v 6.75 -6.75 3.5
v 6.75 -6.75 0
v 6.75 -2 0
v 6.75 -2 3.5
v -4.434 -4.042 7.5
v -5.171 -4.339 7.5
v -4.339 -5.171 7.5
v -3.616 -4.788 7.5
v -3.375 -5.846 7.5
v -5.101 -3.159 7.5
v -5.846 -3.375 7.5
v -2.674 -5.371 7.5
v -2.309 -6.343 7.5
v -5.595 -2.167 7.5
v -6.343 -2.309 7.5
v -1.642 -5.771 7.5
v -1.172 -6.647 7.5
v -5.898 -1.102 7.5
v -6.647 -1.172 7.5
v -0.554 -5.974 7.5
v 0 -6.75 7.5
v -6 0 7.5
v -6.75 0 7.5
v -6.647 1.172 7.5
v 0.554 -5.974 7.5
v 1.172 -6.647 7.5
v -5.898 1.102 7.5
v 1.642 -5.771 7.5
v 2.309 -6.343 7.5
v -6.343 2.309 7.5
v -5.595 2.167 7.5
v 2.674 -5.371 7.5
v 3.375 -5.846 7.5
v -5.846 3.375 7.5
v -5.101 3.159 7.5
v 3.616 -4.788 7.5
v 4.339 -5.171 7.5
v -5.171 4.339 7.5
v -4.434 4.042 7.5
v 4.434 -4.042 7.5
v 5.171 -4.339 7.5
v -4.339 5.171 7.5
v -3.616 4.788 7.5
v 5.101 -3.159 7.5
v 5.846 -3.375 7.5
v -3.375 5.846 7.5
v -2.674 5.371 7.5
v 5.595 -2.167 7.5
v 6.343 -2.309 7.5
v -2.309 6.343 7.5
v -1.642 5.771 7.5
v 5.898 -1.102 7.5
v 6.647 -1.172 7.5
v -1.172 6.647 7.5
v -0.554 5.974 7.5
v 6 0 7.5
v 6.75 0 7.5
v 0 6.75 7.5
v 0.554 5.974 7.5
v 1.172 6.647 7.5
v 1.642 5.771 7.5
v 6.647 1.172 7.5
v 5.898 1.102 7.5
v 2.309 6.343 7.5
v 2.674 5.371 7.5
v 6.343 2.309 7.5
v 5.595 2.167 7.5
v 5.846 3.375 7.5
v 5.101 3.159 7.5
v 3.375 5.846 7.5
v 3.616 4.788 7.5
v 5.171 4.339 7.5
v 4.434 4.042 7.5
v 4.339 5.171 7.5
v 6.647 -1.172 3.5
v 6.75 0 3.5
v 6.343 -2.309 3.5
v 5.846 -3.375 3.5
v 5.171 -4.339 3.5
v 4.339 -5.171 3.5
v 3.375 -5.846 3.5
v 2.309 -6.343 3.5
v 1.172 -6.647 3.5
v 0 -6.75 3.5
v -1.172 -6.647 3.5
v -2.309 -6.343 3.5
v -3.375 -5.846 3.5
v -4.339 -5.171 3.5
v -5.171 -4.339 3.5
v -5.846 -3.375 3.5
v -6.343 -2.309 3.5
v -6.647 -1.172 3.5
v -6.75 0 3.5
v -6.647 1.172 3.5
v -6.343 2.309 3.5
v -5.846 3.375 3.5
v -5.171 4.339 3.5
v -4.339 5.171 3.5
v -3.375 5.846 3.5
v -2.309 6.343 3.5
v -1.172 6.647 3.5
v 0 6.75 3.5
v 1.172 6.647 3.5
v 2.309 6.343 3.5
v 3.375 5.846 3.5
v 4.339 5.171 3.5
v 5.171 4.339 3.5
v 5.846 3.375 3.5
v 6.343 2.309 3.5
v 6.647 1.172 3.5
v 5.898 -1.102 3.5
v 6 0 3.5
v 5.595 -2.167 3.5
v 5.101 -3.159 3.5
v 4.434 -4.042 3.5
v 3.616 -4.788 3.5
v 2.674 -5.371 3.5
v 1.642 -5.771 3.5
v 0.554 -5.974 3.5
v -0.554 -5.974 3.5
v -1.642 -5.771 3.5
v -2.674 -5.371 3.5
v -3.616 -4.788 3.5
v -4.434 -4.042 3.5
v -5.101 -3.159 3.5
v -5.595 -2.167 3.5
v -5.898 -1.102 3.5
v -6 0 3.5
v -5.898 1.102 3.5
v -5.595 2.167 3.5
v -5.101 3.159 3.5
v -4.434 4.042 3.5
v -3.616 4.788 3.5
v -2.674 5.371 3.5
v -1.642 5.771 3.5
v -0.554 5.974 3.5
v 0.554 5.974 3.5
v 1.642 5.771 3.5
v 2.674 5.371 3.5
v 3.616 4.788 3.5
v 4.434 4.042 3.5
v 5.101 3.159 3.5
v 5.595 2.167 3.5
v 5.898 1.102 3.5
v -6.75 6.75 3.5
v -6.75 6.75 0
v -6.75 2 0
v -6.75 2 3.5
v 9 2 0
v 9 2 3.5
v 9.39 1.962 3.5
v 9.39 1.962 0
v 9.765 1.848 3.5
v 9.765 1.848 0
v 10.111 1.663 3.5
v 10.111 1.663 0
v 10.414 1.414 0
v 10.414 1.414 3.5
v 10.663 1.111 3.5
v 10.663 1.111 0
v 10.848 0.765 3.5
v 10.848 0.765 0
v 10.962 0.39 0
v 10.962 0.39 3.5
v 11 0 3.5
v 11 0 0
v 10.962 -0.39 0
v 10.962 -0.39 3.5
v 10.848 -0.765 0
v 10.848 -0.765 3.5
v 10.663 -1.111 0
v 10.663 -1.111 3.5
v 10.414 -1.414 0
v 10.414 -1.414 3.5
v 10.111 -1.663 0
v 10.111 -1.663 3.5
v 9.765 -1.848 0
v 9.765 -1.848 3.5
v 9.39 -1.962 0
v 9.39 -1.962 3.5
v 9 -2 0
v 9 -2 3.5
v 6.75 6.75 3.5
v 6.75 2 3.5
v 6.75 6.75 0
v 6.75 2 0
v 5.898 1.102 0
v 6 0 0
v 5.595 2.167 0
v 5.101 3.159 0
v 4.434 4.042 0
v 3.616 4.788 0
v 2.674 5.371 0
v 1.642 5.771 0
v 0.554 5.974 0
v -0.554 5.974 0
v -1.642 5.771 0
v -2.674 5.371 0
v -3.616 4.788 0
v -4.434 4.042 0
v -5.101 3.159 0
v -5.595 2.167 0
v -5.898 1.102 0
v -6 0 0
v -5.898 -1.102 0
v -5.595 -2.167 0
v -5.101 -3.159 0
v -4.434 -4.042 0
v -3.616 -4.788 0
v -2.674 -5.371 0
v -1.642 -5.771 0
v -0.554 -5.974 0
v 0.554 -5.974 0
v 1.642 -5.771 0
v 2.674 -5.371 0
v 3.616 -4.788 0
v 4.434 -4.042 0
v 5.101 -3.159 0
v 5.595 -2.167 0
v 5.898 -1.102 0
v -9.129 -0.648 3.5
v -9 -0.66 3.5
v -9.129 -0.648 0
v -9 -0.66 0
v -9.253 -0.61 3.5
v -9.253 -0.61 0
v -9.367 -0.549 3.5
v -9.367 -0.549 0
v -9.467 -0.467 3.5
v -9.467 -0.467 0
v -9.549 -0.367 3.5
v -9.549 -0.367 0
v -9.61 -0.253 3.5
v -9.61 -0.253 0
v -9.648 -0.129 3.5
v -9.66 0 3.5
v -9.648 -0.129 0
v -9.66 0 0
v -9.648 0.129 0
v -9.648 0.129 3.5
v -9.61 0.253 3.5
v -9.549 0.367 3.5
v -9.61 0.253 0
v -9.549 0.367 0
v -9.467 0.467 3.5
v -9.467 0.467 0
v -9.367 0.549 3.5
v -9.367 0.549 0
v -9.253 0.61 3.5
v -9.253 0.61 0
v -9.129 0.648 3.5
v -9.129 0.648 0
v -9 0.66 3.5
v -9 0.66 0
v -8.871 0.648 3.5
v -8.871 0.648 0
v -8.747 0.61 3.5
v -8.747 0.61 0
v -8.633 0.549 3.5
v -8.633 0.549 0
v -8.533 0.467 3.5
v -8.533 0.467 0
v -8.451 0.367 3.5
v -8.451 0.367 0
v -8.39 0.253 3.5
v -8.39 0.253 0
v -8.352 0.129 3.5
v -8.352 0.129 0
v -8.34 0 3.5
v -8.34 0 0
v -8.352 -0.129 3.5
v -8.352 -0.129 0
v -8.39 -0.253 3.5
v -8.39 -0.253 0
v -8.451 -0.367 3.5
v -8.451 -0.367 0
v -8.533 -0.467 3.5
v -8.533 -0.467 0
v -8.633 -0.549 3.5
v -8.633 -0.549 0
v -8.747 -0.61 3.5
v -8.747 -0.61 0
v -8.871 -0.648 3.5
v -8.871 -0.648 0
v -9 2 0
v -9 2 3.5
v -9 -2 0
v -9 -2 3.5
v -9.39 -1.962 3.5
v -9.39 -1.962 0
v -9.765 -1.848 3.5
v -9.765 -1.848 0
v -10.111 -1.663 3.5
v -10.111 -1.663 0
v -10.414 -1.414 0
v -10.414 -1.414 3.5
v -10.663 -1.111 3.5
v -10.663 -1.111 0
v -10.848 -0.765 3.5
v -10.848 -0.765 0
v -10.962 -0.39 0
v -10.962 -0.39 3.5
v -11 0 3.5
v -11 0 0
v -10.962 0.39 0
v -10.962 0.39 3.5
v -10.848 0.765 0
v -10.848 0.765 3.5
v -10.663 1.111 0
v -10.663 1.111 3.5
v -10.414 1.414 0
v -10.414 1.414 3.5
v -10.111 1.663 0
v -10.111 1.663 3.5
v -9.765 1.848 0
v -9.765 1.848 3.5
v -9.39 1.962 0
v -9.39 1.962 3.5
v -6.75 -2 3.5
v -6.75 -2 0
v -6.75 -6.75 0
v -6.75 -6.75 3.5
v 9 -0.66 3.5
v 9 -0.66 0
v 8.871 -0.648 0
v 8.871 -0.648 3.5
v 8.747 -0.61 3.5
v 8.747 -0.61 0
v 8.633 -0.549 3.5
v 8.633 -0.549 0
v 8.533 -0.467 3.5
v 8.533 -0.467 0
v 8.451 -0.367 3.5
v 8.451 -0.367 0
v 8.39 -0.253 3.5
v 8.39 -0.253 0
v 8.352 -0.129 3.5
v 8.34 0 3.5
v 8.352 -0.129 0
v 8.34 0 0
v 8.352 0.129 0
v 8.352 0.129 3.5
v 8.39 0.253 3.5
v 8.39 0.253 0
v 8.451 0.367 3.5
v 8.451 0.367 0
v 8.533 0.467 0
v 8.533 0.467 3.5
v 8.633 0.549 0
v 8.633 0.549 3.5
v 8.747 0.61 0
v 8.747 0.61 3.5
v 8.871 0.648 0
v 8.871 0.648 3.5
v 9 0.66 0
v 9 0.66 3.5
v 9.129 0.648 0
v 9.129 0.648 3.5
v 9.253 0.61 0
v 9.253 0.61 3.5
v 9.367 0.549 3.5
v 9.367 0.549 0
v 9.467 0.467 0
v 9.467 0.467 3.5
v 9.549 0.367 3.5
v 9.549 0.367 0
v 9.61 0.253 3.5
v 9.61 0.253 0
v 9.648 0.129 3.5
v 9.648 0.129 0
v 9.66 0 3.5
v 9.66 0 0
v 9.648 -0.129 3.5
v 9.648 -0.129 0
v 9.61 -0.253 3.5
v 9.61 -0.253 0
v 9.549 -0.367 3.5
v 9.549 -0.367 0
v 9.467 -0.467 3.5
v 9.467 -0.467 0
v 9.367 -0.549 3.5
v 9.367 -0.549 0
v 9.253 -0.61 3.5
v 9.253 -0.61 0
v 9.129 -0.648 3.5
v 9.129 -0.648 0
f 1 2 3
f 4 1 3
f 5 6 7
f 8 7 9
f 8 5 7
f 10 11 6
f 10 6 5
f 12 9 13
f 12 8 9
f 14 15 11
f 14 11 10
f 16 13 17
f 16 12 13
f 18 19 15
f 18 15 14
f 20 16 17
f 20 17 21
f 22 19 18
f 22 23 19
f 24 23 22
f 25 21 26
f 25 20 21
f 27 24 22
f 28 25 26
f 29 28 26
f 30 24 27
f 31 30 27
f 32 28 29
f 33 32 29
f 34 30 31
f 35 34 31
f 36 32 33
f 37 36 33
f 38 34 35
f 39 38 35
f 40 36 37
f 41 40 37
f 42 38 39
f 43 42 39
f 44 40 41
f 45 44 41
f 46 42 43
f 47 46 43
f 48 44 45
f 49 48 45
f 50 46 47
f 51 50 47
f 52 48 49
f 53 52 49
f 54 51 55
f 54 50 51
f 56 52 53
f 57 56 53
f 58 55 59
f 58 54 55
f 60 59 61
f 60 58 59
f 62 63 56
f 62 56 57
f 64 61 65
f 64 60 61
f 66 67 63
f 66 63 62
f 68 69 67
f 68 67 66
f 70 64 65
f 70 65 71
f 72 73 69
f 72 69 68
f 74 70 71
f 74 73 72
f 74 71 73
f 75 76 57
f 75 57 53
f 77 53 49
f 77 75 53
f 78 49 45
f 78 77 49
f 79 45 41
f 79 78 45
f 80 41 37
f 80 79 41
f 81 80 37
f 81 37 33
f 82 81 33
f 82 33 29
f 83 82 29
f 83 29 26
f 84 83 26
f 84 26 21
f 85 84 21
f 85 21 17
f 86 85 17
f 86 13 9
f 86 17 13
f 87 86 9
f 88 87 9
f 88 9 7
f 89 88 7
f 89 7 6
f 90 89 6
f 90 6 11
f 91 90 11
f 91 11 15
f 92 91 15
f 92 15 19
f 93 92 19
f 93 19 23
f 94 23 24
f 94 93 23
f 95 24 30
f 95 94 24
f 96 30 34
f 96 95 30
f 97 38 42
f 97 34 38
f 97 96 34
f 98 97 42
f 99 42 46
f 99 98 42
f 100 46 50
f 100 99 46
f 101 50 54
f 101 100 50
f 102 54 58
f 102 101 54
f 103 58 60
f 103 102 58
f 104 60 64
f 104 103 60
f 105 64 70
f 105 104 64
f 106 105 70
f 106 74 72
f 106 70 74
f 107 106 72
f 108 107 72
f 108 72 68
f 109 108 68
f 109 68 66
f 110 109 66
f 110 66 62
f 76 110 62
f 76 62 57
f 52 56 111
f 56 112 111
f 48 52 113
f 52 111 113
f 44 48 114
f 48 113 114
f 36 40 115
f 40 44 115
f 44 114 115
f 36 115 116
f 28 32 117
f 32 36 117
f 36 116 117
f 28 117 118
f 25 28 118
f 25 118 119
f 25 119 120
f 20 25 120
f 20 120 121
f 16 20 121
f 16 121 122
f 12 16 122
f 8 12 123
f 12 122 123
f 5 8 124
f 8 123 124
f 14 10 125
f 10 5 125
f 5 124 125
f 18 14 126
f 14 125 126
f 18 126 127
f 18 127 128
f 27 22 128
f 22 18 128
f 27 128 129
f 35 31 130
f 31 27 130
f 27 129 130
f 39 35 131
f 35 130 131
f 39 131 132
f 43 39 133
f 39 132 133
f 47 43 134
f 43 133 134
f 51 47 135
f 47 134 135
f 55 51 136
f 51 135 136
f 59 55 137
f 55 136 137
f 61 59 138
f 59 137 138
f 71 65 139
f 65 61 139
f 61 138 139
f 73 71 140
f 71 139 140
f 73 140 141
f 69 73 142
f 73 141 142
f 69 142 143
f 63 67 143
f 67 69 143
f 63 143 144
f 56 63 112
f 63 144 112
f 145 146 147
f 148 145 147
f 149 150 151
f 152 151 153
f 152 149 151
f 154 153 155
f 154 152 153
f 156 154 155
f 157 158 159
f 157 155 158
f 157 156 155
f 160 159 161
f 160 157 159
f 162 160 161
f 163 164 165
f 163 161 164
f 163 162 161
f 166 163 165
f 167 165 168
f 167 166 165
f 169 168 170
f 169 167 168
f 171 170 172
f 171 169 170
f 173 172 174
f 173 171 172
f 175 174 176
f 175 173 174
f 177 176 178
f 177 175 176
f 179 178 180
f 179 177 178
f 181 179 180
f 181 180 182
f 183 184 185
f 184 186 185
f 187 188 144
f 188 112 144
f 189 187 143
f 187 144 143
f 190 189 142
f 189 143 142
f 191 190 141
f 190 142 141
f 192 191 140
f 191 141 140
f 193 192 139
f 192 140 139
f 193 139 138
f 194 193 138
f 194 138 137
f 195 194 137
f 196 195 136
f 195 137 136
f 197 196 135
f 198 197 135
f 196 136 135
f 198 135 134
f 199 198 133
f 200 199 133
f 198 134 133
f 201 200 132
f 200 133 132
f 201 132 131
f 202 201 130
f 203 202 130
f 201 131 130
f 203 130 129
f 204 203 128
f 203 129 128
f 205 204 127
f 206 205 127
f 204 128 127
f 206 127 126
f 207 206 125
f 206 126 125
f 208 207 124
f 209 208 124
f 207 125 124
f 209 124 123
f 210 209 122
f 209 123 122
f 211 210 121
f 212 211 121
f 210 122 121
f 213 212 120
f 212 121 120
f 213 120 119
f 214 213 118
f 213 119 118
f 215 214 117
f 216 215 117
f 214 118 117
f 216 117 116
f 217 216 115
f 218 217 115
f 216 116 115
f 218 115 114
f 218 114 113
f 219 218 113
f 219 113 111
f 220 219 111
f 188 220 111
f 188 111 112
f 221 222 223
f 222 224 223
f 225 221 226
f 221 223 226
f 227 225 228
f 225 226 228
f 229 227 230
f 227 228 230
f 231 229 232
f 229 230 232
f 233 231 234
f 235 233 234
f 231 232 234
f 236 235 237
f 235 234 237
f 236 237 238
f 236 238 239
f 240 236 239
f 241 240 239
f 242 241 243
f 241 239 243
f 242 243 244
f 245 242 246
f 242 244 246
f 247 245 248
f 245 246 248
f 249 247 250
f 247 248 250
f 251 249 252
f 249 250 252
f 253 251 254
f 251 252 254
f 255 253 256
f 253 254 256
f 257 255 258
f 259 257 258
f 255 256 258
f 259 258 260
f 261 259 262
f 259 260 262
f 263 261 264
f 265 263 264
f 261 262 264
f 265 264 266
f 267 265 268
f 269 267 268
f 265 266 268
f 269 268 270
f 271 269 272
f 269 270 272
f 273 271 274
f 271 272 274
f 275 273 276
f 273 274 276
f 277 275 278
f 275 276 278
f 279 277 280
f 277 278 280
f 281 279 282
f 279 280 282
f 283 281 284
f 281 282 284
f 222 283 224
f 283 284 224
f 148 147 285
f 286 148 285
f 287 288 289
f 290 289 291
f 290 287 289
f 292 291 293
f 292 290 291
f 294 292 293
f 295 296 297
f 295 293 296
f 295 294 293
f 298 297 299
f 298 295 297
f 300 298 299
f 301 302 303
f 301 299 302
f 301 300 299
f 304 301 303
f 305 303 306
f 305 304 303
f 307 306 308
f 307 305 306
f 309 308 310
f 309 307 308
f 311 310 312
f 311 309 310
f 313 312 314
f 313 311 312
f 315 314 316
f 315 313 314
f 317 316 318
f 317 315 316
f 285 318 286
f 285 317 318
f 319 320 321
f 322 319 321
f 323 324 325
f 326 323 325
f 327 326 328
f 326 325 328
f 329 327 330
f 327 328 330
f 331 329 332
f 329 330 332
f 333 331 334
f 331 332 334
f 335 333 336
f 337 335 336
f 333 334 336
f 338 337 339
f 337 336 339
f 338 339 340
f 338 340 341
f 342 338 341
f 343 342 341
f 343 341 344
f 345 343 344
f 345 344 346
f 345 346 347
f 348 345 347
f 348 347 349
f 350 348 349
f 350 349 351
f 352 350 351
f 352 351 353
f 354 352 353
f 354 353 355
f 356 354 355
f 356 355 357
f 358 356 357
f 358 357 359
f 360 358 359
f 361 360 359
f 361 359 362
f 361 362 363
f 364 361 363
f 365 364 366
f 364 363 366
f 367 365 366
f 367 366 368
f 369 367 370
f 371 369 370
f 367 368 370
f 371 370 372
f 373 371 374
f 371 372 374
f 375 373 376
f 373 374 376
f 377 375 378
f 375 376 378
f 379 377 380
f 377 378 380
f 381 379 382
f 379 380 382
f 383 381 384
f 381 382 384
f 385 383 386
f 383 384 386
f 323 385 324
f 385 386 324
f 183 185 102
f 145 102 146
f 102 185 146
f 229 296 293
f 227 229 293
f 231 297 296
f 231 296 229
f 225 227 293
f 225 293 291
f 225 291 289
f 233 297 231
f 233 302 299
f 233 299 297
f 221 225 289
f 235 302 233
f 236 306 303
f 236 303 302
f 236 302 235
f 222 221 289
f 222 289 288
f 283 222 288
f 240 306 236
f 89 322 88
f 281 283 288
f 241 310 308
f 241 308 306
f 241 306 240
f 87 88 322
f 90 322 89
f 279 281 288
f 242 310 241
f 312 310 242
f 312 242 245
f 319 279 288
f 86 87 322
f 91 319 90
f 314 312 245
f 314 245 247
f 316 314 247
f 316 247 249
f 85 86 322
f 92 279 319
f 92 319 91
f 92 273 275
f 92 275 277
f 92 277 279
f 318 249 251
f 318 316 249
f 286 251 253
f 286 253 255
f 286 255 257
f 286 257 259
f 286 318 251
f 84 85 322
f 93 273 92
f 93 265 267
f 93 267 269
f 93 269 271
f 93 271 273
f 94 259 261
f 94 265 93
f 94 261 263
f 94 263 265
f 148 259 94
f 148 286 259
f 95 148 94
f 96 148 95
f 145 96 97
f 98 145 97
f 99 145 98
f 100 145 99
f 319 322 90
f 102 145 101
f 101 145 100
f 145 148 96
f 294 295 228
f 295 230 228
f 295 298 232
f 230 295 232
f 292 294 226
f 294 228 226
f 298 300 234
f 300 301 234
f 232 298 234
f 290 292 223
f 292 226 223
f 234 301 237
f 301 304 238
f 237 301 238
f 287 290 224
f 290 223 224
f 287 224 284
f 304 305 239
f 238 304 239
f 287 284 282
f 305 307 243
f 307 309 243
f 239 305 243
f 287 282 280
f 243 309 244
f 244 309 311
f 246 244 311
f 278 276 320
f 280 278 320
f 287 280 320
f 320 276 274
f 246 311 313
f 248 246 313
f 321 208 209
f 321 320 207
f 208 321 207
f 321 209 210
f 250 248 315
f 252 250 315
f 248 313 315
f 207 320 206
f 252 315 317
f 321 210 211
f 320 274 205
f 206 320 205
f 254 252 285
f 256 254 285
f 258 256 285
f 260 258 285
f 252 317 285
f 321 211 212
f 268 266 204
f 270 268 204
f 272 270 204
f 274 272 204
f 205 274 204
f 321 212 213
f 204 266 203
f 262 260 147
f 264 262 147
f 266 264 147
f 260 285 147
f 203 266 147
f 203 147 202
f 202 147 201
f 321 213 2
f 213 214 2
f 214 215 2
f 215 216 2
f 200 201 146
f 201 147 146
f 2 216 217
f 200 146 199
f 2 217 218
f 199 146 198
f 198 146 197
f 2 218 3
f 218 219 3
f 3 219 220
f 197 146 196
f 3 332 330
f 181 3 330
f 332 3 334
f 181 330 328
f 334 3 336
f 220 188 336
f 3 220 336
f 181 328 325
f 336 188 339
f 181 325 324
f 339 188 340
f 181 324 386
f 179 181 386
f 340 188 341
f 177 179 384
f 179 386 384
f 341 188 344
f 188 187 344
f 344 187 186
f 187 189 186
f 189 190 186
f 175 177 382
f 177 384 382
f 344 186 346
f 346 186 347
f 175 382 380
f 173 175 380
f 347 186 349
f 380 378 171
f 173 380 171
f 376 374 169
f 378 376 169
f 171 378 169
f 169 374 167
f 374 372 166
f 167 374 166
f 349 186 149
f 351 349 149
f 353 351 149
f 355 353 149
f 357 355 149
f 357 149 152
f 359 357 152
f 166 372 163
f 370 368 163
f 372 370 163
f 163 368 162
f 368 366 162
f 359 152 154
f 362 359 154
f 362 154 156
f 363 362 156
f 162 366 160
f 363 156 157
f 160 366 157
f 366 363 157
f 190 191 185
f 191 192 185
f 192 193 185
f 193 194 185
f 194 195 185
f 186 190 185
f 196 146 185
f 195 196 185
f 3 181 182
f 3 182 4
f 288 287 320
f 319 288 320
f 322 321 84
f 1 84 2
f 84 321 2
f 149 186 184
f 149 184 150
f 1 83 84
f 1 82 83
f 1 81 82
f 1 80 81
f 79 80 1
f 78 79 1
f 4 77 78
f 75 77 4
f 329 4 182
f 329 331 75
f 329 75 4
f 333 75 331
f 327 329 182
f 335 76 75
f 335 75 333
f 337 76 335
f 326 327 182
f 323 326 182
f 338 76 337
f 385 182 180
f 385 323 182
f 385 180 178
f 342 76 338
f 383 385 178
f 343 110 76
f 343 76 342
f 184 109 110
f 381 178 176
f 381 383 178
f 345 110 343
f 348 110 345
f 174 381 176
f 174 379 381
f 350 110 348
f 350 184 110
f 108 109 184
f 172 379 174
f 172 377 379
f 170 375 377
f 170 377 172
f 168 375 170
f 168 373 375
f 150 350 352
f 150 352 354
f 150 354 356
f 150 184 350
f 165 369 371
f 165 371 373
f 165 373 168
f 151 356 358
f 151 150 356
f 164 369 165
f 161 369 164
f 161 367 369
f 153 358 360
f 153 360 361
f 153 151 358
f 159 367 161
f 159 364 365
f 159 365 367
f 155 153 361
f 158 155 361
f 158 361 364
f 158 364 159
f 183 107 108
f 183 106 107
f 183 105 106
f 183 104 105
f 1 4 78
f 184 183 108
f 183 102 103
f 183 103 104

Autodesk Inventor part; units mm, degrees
ref_plane "YZ Plane" through (0, 0, 0) normal (1, 0, 0) x (0, 1, 0)
ref_plane "XZ Plane" through (0, 0, 0) normal (0, 1, 0) x (-1, 0, 0)
ref_plane "XY Plane" through (0, 0, 0) normal (0, 0, 1) x (1, 0, 0)
sketch "Skizze1" plane through (0, 0, 0) normal (0, 0, 1) x (1, 0, 0)
  line L0 (-6.75, -6.75) -> (6.75, -6.75)
  line L1 (6.75, 6.75) -> (-6.75, 6.75)
  line L2 (-6.75, -6.75) -> (6.75, 6.75) construction
  line L3 (6.75, -6.75) -> (-6.75, 6.75) construction
  line L4 (-6.75, 2) -> (-9, 2)
  line L5 (-9, -2) -> (-6.75, -2)
  line L6 (6.75, 2) -> (9, 2)
  line L7 (9, -2) -> (6.75, -2)
  arc A0 (-9, 2) -> (-9, -2) centre (-9, 0) ccw
  arc A1 (9, -2) -> (9, 2) centre (9, 0) ccw
  line L8 (-6.75, 6.75) -> (-6.75, 2)
  line L9 (-6.75, -2) -> (-6.75, -6.75)
  line L10 (6.75, -6.75) -> (6.75, -2)
  line L11 (6.75, 2) -> (6.75, 6.75)
  line L12 (0, 9.45) -> (0, -9.45) projected
  line L13 (-15.4, 0) -> (15.4, 0) projected
  point P0 (0, 0)
  dimension "d0" = 13.5
  dimension "d1" = 13.5
  dimension "d2" = 18
  dimension "d3" = 4
extrude "Extrusion1" add sketch "Skizze1" along normal blind 3.5
sketch "Skizze4" plane through (0, 0, 3.5) normal (0, 0, 1) x (1, 0, 0)
  arc A0 (-9, 2) -> (-9, -2) centre (-9, 0) ccw projected
  arc A1 (9, -2) -> (9, 2) centre (9, 0) ccw projected
  point P0 (0, 0)
hole "Bohrung1" at (-9, 0, 3.5) at (9, 0, 3.5) direction (0, 0, -1) diameter 1.321 end through all thread size "M1.7x0.35" class "6H" standard "ISO Metric profile"
sketch "Skizze2" plane through (0, 0, 3.5) normal (0, 0, 1) x (1, 0, 0)
  circle A0 centre (0, 0) radius 6.75
  circle A1 centre (0, 0) radius 6
  dimension "d6" = 13.5
  dimension "d7" = 12
extrude "Extrusion2" add sketch "Skizze2" along normal blind 4
thread "Gewinde1" size "M12x0.5" class "6H" standard "ANSI Metric M Profile" full length
sketch "Skizze3" plane through (0, 0, 3.5) normal (0, 0, 1) x (1, 0, 0)
  circle A0 centre (0, 0) radius 6 projected
extrude "Extrusion3" cut sketch "Skizze3" against normal through all
properties part number "Linsenhalter M12" material "PC/ABS-Kunststoff"
